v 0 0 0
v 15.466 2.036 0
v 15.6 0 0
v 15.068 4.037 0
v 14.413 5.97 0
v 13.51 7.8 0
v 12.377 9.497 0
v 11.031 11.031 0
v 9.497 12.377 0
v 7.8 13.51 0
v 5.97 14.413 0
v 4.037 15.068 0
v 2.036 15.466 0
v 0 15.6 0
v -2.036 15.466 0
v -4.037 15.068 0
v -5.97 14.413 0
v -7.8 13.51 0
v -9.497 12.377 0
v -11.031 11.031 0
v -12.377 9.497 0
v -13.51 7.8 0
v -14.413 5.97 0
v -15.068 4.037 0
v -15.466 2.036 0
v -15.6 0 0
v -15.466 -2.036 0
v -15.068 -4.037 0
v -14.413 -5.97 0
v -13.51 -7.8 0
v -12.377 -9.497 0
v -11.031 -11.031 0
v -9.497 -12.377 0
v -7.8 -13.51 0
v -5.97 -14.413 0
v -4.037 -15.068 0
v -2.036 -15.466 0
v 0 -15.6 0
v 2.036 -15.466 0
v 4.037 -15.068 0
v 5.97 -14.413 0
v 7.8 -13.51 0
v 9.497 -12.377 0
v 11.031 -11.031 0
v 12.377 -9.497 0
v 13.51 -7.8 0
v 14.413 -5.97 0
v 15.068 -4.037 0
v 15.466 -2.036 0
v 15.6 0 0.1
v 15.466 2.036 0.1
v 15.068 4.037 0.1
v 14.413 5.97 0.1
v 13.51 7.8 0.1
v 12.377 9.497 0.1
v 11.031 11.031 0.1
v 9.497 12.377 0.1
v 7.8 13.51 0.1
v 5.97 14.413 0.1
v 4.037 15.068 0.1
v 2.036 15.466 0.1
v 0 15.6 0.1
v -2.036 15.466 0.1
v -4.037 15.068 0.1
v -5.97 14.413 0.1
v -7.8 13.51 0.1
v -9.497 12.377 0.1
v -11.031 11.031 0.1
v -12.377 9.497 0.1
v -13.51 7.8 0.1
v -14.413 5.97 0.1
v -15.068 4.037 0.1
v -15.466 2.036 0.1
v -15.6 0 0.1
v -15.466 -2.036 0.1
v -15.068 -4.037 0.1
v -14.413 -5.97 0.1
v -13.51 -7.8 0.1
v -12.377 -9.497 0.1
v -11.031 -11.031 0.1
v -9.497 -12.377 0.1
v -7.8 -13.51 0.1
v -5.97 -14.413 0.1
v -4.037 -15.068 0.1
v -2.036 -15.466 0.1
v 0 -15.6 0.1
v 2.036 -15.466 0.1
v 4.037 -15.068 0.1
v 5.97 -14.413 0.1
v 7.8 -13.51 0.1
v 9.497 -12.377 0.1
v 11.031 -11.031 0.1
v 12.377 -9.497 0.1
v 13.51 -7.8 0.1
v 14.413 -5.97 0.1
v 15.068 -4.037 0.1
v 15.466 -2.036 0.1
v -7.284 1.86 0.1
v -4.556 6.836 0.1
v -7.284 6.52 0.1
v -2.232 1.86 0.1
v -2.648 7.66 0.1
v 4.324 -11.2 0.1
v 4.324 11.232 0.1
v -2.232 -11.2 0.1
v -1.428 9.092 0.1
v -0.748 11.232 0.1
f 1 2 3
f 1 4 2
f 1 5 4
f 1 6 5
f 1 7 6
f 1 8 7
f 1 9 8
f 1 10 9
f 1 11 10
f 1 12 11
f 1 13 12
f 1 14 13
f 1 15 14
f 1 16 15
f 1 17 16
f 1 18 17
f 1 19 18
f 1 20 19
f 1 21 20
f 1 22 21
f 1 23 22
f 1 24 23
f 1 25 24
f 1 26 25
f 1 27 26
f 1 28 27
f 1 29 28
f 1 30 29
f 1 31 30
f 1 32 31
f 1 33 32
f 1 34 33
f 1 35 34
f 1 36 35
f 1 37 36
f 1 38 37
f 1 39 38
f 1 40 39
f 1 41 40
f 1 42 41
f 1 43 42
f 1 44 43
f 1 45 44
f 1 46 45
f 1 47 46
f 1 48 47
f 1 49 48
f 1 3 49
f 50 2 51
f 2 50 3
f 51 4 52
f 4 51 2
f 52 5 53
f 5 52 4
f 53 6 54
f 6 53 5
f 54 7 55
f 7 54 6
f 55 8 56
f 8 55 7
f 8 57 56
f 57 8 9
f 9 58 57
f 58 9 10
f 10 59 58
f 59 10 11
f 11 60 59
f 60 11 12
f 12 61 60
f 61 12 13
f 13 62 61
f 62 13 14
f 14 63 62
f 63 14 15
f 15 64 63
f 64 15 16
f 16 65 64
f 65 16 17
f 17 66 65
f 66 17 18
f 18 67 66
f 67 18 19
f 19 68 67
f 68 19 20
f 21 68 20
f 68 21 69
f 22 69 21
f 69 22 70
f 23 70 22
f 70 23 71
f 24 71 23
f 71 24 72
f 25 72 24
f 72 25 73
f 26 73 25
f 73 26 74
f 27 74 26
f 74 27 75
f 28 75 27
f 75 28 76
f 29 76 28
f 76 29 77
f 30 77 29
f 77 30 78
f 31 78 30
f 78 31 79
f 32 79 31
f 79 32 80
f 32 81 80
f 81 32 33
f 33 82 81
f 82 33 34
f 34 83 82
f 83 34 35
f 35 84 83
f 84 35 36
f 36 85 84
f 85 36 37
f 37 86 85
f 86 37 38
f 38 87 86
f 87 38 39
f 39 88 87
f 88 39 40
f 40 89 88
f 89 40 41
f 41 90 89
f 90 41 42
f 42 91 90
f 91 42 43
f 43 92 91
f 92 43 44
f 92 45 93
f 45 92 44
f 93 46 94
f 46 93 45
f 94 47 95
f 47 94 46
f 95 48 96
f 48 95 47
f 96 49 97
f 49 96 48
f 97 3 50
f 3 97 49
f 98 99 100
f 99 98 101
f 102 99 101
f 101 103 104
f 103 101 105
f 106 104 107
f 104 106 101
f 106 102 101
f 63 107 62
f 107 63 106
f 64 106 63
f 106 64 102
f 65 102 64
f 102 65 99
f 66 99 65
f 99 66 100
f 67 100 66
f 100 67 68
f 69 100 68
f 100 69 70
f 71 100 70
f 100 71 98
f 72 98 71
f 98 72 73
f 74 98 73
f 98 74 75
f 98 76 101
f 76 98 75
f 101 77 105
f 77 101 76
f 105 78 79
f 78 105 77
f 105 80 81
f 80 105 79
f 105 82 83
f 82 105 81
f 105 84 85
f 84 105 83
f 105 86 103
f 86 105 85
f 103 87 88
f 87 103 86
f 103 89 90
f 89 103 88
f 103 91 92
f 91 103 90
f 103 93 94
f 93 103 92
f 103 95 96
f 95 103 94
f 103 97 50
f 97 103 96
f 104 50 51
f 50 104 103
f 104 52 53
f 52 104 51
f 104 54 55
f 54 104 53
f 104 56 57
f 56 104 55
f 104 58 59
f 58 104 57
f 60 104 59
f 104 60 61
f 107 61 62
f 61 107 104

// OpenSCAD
// file: ../p/48/1-4cyli.scad
use <../../lib.scad>
function ldraw_lib__48__1_4cyli() = [
// 0 Hi-Res Cylinder 0.25
// 0 Name: 48\1-4cyli.dat
// 0 Author: Manfred Moolhuysen
// 0 !LDRAW_ORG 48_Primitive UPDATE 2009-01
// 0 !LICENSE Licensed under CC BY 2.0 and CC BY 4.0 : see CAreadme.txt
// 
// 0 BFC CERTIFY CCW
  [0,"BFC","CERTIFY"],
  [0,"BFC","CCW"],
// 
// 0 !HISTORY 1999-07-05 [PTadmin] Official Update 1999-05
// 0 !HISTORY 2002-02-28 [hafhead] Added BFC statement
// 0 !HISTORY 2002-04-25 [PTadmin] Official Update 2002-02
// 0 !HISTORY 2007-06-24 [PTadmin] Header formatted for Contributor Agreement
// 0 !HISTORY 2008-07-01 [PTadmin] Official Update 2008-01
// 0 !HISTORY 2008-07-07 [guyvivan] Made BFC'ed CCW (2005-12-06)
// 0 !HISTORY 2009-05-02 [PTadmin] Official Update 2009-01
// 
// 
// 4 16 0.9914 0 0.1305 1 0 0 1 1 0 0.9914 1 0.1305
  [4,16,0.9914,0,0.1305,1,0,0,1,1,0,0.9914,1,0.1305],
// 4 16 0.9659 0 0.2588 0.9914 0 0.1305 0.9914 1 0.1305 0.9659 1 0.2588
  [4,16,0.9659,0,0.2588,0.9914,0,0.1305,0.9914,1,0.1305,0.9659,1,0.2588],
// 4 16 0.9239 0 0.3827 0.9659 0 0.2588 0.9659 1 0.2588 0.9239 1 0.3827
  [4,16,0.9239,0,0.3827,0.9659,0,0.2588,0.9659,1,0.2588,0.9239,1,0.3827],
// 4 16 0.866 0 0.5 0.9239 0 0.3827 0.9239 1 0.3827 0.866 1 0.5
  [4,16,0.866,0,0.5,0.9239,0,0.3827,0.9239,1,0.3827,0.866,1,0.5],
// 4 16 0.7934 0 0.6088 0.866 0 0.5 0.866 1 0.5 0.7934 1 0.6088
  [4,16,0.7934,0,0.6088,0.866,0,0.5,0.866,1,0.5,0.7934,1,0.6088],
// 4 16 0.7071 0 0.7071 0.7934 0 0.6088 0.7934 1 0.6088 0.7071 1 0.7071
  [4,16,0.7071,0,0.7071,0.7934,0,0.6088,0.7934,1,0.6088,0.7071,1,0.7071],
// 4 16 0.6088 0 0.7934 0.7071 0 0.7071 0.7071 1 0.7071 0.6088 1 0.7934
  [4,16,0.6088,0,0.7934,0.7071,0,0.7071,0.7071,1,0.7071,0.6088,1,0.7934],
// 4 16 0.5 0 0.866 0.6088 0 0.7934 0.6088 1 0.7934 0.5 1 0.866
  [4,16,0.5,0,0.866,0.6088,0,0.7934,0.6088,1,0.7934,0.5,1,0.866],
// 4 16 0.3827 0 0.9239 0.5 0 0.866 0.5 1 0.866 0.3827 1 0.9239
  [4,16,0.3827,0,0.9239,0.5,0,0.866,0.5,1,0.866,0.3827,1,0.9239],
// 4 16 0.2588 0 0.9659 0.3827 0 0.9239 0.3827 1 0.9239 0.2588 1 0.9659
  [4,16,0.2588,0,0.9659,0.3827,0,0.9239,0.3827,1,0.9239,0.2588,1,0.9659],
// 4 16 0.1305 0 0.9914 0.2588 0 0.9659 0.2588 1 0.9659 0.1305 1 0.9914
  [4,16,0.1305,0,0.9914,0.2588,0,0.9659,0.2588,1,0.9659,0.1305,1,0.9914],
// 4 16 0 0 1 0.1305 0 0.9914 0.1305 1 0.9914 0 1 1
  [4,16,0,0,1,0.1305,0,0.9914,0.1305,1,0.9914,0,1,1],
// 
// 0 conditional lines
// 5 24 1 1 0 1 0 0 1 1 -1 0.9914 1 0.1305
  [5,24,1,1,0,1,0,0,1,1,-1,0.9914,1,0.1305],
// 5 24 0.9914 1 0.1305 0.9914 0 0.1305 1 1 0 0.9659 1 0.2588
  [5,24,0.9914,1,0.1305,0.9914,0,0.1305,1,1,0,0.9659,1,0.2588],
// 5 24 0.9659 1 0.2588 0.9659 0 0.2588 0.9914 1 0.1305 0.9239 1 0.3827
  [5,24,0.9659,1,0.2588,0.9659,0,0.2588,0.9914,1,0.1305,0.9239,1,0.3827],
// 5 24 0.9239 1 0.3827 0.9239 0 0.3827 0.9659 1 0.2588 0.866 1 0.5
  [5,24,0.9239,1,0.3827,0.9239,0,0.3827,0.9659,1,0.2588,0.866,1,0.5],
// 5 24 0.866 1 0.5 0.866 0 0.5 0.9239 1 0.3827 0.7934 1 0.6088
  [5,24,0.866,1,0.5,0.866,0,0.5,0.9239,1,0.3827,0.7934,1,0.6088],
// 5 24 0.7934 1 0.6088 0.7934 0 0.6088 0.866 1 0.5 0.7071 1 0.7071
  [5,24,0.7934,1,0.6088,0.7934,0,0.6088,0.866,1,0.5,0.7071,1,0.7071],
// 5 24 0.7071 1 0.7071 0.7071 0 0.7071 0.7934 1 0.6088 0.6088 1 0.7934
  [5,24,0.7071,1,0.7071,0.7071,0,0.7071,0.7934,1,0.6088,0.6088,1,0.7934],
// 5 24 0.6088 1 0.7934 0.6088 0 0.7934 0.7071 1 0.7071 0.5 1 0.866
  [5,24,0.6088,1,0.7934,0.6088,0,0.7934,0.7071,1,0.7071,0.5,1,0.866],
// 5 24 0.5 1 0.866 0.5 0 0.866 0.6088 1 0.7934 0.3827 1 0.9239
  [5,24,0.5,1,0.866,0.5,0,0.866,0.6088,1,0.7934,0.3827,1,0.9239],
// 5 24 0.3827 1 0.9239 0.3827 0 0.9239 0.5 1 0.866 0.2588 1 0.9659
  [5,24,0.3827,1,0.9239,0.3827,0,0.9239,0.5,1,0.866,0.2588,1,0.9659],
// 5 24 0.2588 1 0.9659 0.2588 0 0.9659 0.3827 1 0.9239 0.1305 1 0.9914
  [5,24,0.2588,1,0.9659,0.2588,0,0.9659,0.3827,1,0.9239,0.1305,1,0.9914],
// 5 24 0.1305 1 0.9914 0.1305 0 0.9914 0.2588 1 0.9659 0 1 1
  [5,24,0.1305,1,0.9914,0.1305,0,0.9914,0.2588,1,0.9659,0,1,1],
// 5 24 0 1 1 0 0 1 0.1305 1 0.9914 -1 1 1
  [5,24,0,1,1,0,0,1,0.1305,1,0.9914,-1,1,1],
// 
// 0 end of file
];
module ldraw_lib__48__1_4cyli(step=0, col=false, unit=2/5, alt=false, line=0.2, solid=!$preview)
    makepoly(ldraw_lib__48__1_4cyli(), step=step, col=col, unit=unit, alt=alt, line=line, solid=solid);
ldraw_lib__48__1_4cyli(line=0.2);
// file: ../p/48/4-4disc.scad
use <../../lib.scad>
function ldraw_lib__48__4_4disc() = [
// 0 Hi-Res Disc 1.0
// 0 Name: 48\4-4disc.dat
// 0 Author: Miklos Hosszu [hmick]
// 0 !LDRAW_ORG 48_Primitive UPDATE 2012-02
// 0 !LICENSE Licensed under CC BY 2.0 and CC BY 4.0 : see CAreadme.txt
// 
// 0 BFC CERTIFY CCW
  [0,"BFC","CERTIFY"],
  [0,"BFC","CCW"],
// 
// 0 !HISTORY 2004-11-06 [PTadmin] Official Update 2004-04
// 0 !HISTORY 2007-06-24 [PTadmin] Header formatted for Contributor Agreement
// 0 !HISTORY 2008-07-01 [PTadmin] Official Update 2008-01
// 0 !HISTORY 2012-02-27 [Philo] Changed to CCW
// 0 !HISTORY 2012-08-09 [PTadmin] Official Update 2012-02
// 
// 
// 3 16 1 0 0 0.9914 0 0.1305 0 0 0
  [3,16,1,0,0,0.9914,0,0.1305,0,0,0],
// 3 16 0.9914 0 0.1305 0.9659 0 0.2588 0 0 0
  [3,16,0.9914,0,0.1305,0.9659,0,0.2588,0,0,0],
// 3 16 0.9659 0 0.2588 0.9239 0 0.3827 0 0 0
  [3,16,0.9659,0,0.2588,0.9239,0,0.3827,0,0,0],
// 3 16 0.9239 0 0.3827 0.866 0 0.5 0 0 0
  [3,16,0.9239,0,0.3827,0.866,0,0.5,0,0,0],
// 3 16 0.866 0 0.5 0.7934 0 0.6088 0 0 0
  [3,16,0.866,0,0.5,0.7934,0,0.6088,0,0,0],
// 3 16 0.7934 0 0.6088 0.7071 0 0.7071 0 0 0
  [3,16,0.7934,0,0.6088,0.7071,0,0.7071,0,0,0],
// 3 16 0.7071 0 0.7071 0.6088 0 0.7934 0 0 0
  [3,16,0.7071,0,0.7071,0.6088,0,0.7934,0,0,0],
// 3 16 0.6088 0 0.7934 0.5 0 0.866 0 0 0
  [3,16,0.6088,0,0.7934,0.5,0,0.866,0,0,0],
// 3 16 0.5 0 0.866 0.3827 0 0.9239 0 0 0
  [3,16,0.5,0,0.866,0.3827,0,0.9239,0,0,0],
// 3 16 0.3827 0 0.9239 0.2588 0 0.9659 0 0 0
  [3,16,0.3827,0,0.9239,0.2588,0,0.9659,0,0,0],
// 3 16 0.2588 0 0.9659 0.1305 0 0.9914 0 0 0
  [3,16,0.2588,0,0.9659,0.1305,0,0.9914,0,0,0],
// 3 16 0.1305 0 0.9914 0 0 1 0 0 0
  [3,16,0.1305,0,0.9914,0,0,1,0,0,0],
// 3 16 0 0 1 -0.1305 0 0.9914 0 0 0
  [3,16,0,0,1,-0.1305,0,0.9914,0,0,0],
// 3 16 -0.1305 0 0.9914 -0.2588 0 0.9659 0 0 0
  [3,16,-0.1305,0,0.9914,-0.2588,0,0.9659,0,0,0],
// 3 16 -0.2588 0 0.9659 -0.3827 0 0.9239 0 0 0
  [3,16,-0.2588,0,0.9659,-0.3827,0,0.9239,0,0,0],
// 3 16 -0.3827 0 0.9239 -0.5 0 0.866 0 0 0
  [3,16,-0.3827,0,0.9239,-0.5,0,0.866,0,0,0],
// 3 16 -0.5 0 0.866 -0.6088 0 0.7934 0 0 0
  [3,16,-0.5,0,0.866,-0.6088,0,0.7934,0,0,0],
// 3 16 -0.6088 0 0.7934 -0.7071 0 0.7071 0 0 0
  [3,16,-0.6088,0,0.7934,-0.7071,0,0.7071,0,0,0],
// 3 16 -0.7071 0 0.7071 -0.7934 0 0.6088 0 0 0
  [3,16,-0.7071,0,0.7071,-0.7934,0,0.6088,0,0,0],
// 3 16 -0.7934 0 0.6088 -0.866 0 0.5 0 0 0
  [3,16,-0.7934,0,0.6088,-0.866,0,0.5,0,0,0],
// 3 16 -0.866 0 0.5 -0.9239 0 0.3827 0 0 0
  [3,16,-0.866,0,0.5,-0.9239,0,0.3827,0,0,0],
// 3 16 -0.9239 0 0.3827 -0.9659 0 0.2588 0 0 0
  [3,16,-0.9239,0,0.3827,-0.9659,0,0.2588,0,0,0],
// 3 16 -0.9659 0 0.2588 -0.9914 0 0.1305 0 0 0
  [3,16,-0.9659,0,0.2588,-0.9914,0,0.1305,0,0,0],
// 3 16 -0.9914 0 0.1305 -1 0 0 0 0 0
  [3,16,-0.9914,0,0.1305,-1,0,0,0,0,0],
// 3 16 -1 0 0 -0.9914 0 -0.1305 0 0 0
  [3,16,-1,0,0,-0.9914,0,-0.1305,0,0,0],
// 3 16 -0.9914 0 -0.1305 -0.9659 0 -0.2588 0 0 0
  [3,16,-0.9914,0,-0.1305,-0.9659,0,-0.2588,0,0,0],
// 3 16 -0.9659 0 -0.2588 -0.9239 0 -0.3827 0 0 0
  [3,16,-0.9659,0,-0.2588,-0.9239,0,-0.3827,0,0,0],
// 3 16 -0.9239 0 -0.3827 -0.866 0 -0.5 0 0 0
  [3,16,-0.9239,0,-0.3827,-0.866,0,-0.5,0,0,0],
// 3 16 -0.866 0 -0.5 -0.7934 0 -0.6088 0 0 0
  [3,16,-0.866,0,-0.5,-0.7934,0,-0.6088,0,0,0],
// 3 16 -0.7934 0 -0.6088 -0.7071 0 -0.7071 0 0 0
  [3,16,-0.7934,0,-0.6088,-0.7071,0,-0.7071,0,0,0],
// 3 16 -0.7071 0 -0.7071 -0.6088 0 -0.7934 0 0 0
  [3,16,-0.7071,0,-0.7071,-0.6088,0,-0.7934,0,0,0],
// 3 16 -0.6088 0 -0.7934 -0.5 0 -0.866 0 0 0
  [3,16,-0.6088,0,-0.7934,-0.5,0,-0.866,0,0,0],
// 3 16 -0.5 0 -0.866 -0.3827 0 -0.9239 0 0 0
  [3,16,-0.5,0,-0.866,-0.3827,0,-0.9239,0,0,0],
// 3 16 -0.3827 0 -0.9239 -0.2588 0 -0.9659 0 0 0
  [3,16,-0.3827,0,-0.9239,-0.2588,0,-0.9659,0,0,0],
// 3 16 -0.2588 0 -0.9659 -0.1305 0 -0.9914 0 0 0
  [3,16,-0.2588,0,-0.9659,-0.1305,0,-0.9914,0,0,0],
// 3 16 -0.1305 0 -0.9914 0 0 -1 0 0 0
  [3,16,-0.1305,0,-0.9914,0,0,-1,0,0,0],
// 3 16 0 0 -1 0.1305 0 -0.9914 0 0 0
  [3,16,0,0,-1,0.1305,0,-0.9914,0,0,0],
// 3 16 0.1305 0 -0.9914 0.2588 0 -0.9659 0 0 0
  [3,16,0.1305,0,-0.9914,0.2588,0,-0.9659,0,0,0],
// 3 16 0.2588 0 -0.9659 0.3827 0 -0.9239 0 0 0
  [3,16,0.2588,0,-0.9659,0.3827,0,-0.9239,0,0,0],
// 3 16 0.3827 0 -0.9239 0.5 0 -0.866 0 0 0
  [3,16,0.3827,0,-0.9239,0.5,0,-0.866,0,0,0],
// 3 16 0.5 0 -0.866 0.6088 0 -0.7934 0 0 0
  [3,16,0.5,0,-0.866,0.6088,0,-0.7934,0,0,0],
// 3 16 0.6088 0 -0.7934 0.7071 0 -0.7071 0 0 0
  [3,16,0.6088,0,-0.7934,0.7071,0,-0.7071,0,0,0],
// 3 16 0.7071 0 -0.7071 0.7934 0 -0.6088 0 0 0
  [3,16,0.7071,0,-0.7071,0.7934,0,-0.6088,0,0,0],
// 3 16 0.7934 0 -0.6088 0.866 0 -0.5 0 0 0
  [3,16,0.7934,0,-0.6088,0.866,0,-0.5,0,0,0],
// 3 16 0.866 0 -0.5 0.9239 0 -0.3827 0 0 0
  [3,16,0.866,0,-0.5,0.9239,0,-0.3827,0,0,0],
// 3 16 0.9239 0 -0.3827 0.9659 0 -0.2588 0 0 0
  [3,16,0.9239,0,-0.3827,0.9659,0,-0.2588,0,0,0],
// 3 16 0.9659 0 -0.2588 0.9914 0 -0.1305 0 0 0
  [3,16,0.9659,0,-0.2588,0.9914,0,-0.1305,0,0,0],
// 3 16 0.9914 0 -0.1305 1 0 0 0 0 0
  [3,16,0.9914,0,-0.1305,1,0,0,0,0,0],
];
module ldraw_lib__48__4_4disc(step=0, col=false, unit=2/5, alt=false, line=0.2, solid=!$preview)
    makepoly(ldraw_lib__48__4_4disc(), step=step, col=col, unit=unit, alt=alt, line=line, solid=solid);
ldraw_lib__48__4_4disc(line=0.2);
// file: ../p/48/4-4cyli.scad
use <../../lib.scad>
use <1-4cyli.scad>
function ldraw_lib__48__4_4cyli() = [
// 0 Hi-Res Cylinder 1.0
// 0 Name: 48\4-4cyli.dat
// 0 Author: Paul Easter [pneaster]
// 0 !LDRAW_ORG 48_Primitive UPDATE 2012-02
// 0 !LICENSE Licensed under CC BY 4.0 : see CAreadme.txt
// 
// 0 BFC CERTIFY CCW
  [0,"BFC","CERTIFY"],
  [0,"BFC","CCW"],
// 
// 0 !HISTORY 2002-08-18 [PTadmin] Official Update 2002-04
// 0 !HISTORY 2007-06-24 [PTadmin] Header formatted for Contributor Agreement
// 0 !HISTORY 2008-07-01 [PTadmin] Official Update 2008-01
// 0 !HISTORY 2012-02-27 [Philo] Changed to CCW
// 0 !HISTORY 2012-08-09 [PTadmin] Official Update 2012-02
// 
// 
// 1 16 0 0 0 1 0 0 0 1 0 0 0 1 48\1-4cyli.dat
  [1,16,0,0,0,1,0,0,0,1,0,0,0,1, ldraw_lib__48__1_4cyli()],
// 1 16 0 0 0 0 0 -1 0 1 0 1 0 0 48\1-4cyli.dat
  [1,16,0,0,0,0,0,-1,0,1,0,1,0,0, ldraw_lib__48__1_4cyli()],
// 1 16 0 0 0 -1 0 0 0 1 0 0 0 -1 48\1-4cyli.dat
  [1,16,0,0,0,-1,0,0,0,1,0,0,0,-1, ldraw_lib__48__1_4cyli()],
// 1 16 0 0 0 0 0 1 0 1 0 -1 0 0 48\1-4cyli.dat
  [1,16,0,0,0,0,0,1,0,1,0,-1,0,0, ldraw_lib__48__1_4cyli()],
];
module ldraw_lib__48__4_4cyli(step=0, col=false, unit=2/5, alt=false, line=0.2, solid=!$preview)
    makepoly(ldraw_lib__48__4_4cyli(), step=step, col=col, unit=unit, alt=alt, line=line, solid=solid);
ldraw_lib__48__4_4cyli(line=0.2);
// file: ../p/48/4-4cylc3.scad
use <../../lib.scad>
use <4-4cyli.scad>
use <4-4disc.scad>
function ldraw_lib__48__4_4cylc3() = [
// 0 Hi-Res Cylinder Closed 1.0 without Top or Bottom Edge Lines
// 0 Name: 48\4-4cylc3.dat
// 0 Author: Chris Dee [cwdee]
// 0 !LDRAW_ORG 48_Primitive UPDATE 2017-01
// 0 !LICENSE Licensed under CC BY 4.0 : see CAreadme.txt
// 
// 0 BFC CERTIFY CCW
  [0,"BFC","CERTIFY"],
  [0,"BFC","CCW"],
// 
// 0 !HISTORY 2017-12-30 [PTadmin] Official Update 2017-01
// 
// 
// 1 16 0 0 0 1 0 0 0 1 0 0 0 1 48\4-4disc.dat
  [1,16,0,0,0,1,0,0,0,1,0,0,0,1, ldraw_lib__48__4_4disc()],
// 1 16 0 0 0 1 0 0 0 1 0 0 0 1 48\4-4cyli.dat
  [1,16,0,0,0,1,0,0,0,1,0,0,0,1, ldraw_lib__48__4_4cyli()],
// 0
];
module ldraw_lib__48__4_4cylc3(step=0, col=false, unit=2/5, alt=false, line=0.2, solid=!$preview)
    makepoly(ldraw_lib__48__4_4cylc3(), step=step, col=col, unit=unit, alt=alt, line=line, solid=solid);
ldraw_lib__48__4_4cylc3(line=0.2);
// main file
use <../lib.scad>
use <../p/48/4-4cylc3.scad>
function ldraw_lib__004462a() = [
// 0 Sticker  3.9 x  3.9 Round with Black "1" on White Background
// 0 Name: 004462a.dat
// 0 Author: Takeshi Takahashi [RainbowDolphin]
// 0 !LDRAW_ORG Part UPDATE 2023-03
// 0 !LICENSE Licensed under CC BY 4.0 : see CAreadme.txt
// 
// 0 BFC CERTIFY CCW
  [0,"BFC","CERTIFY"],
  [0,"BFC","CCW"],
// 
// 0 !KEYWORDS Bricklink 392.1stk01, Brickowl 792264, Formula 1, Racer
// 0 !KEYWORDS Rebrickable 004462, Set 392-1
// 
// 0 !HISTORY 2023-06-24 [OrionP] Official Update 2023-03
// 
// 
// 1 16 0 0 0 39 0 0 0 -0.25 0 0 0 39 48\4-4cylc3.dat
  [1,16,0,0,0,39,0,0,0,-0.25,0,0,0,39, ldraw_lib__48__4_4cylc3()],
// 4 0 -18.21 -0.25 4.65 -5.58 -0.25 4.65 -11.39 -0.25 17.09 -18.21 -0.25 16.3
  [4,0,-18.21,-0.25,4.65,-5.58,-0.25,4.65,-11.39,-0.25,17.09,-18.21,-0.25,16.3],
// 3 0 -6.62 -0.25 19.15 -11.39 -0.25 17.09 -5.58 -0.25 4.65
  [3,0,-6.62,-0.25,19.15,-11.39,-0.25,17.09,-5.58,-0.25,4.65],
// 4 0 10.81 -0.25 -28 10.81 -0.25 28.08 -5.58 -0.25 4.65 -5.58 -0.25 -28
  [4,0,10.81,-0.25,-28,10.81,-0.25,28.08,-5.58,-0.25,4.65,-5.58,-0.25,-28],
// 4 0 10.81 -0.25 28.08 -1.87 -0.25 28.08 -3.57 -0.25 22.73 -5.58 -0.25 4.65
  [4,0,10.81,-0.25,28.08,-1.87,-0.25,28.08,-3.57,-0.25,22.73,-5.58,-0.25,4.65],
// 3 0 -3.57 -0.25 22.73 -6.62 -0.25 19.15 -5.58 -0.25 4.65
  [3,0,-3.57,-0.25,22.73,-6.62,-0.25,19.15,-5.58,-0.25,4.65],
// 4 15 -1.87 -0.25 28.08 0 -0.25 39 -5.0895 -0.25 38.6646 -3.57 -0.25 22.73
  [4,15,-1.87,-0.25,28.08,0,-0.25,39,-5.0895,-0.25,38.6646,-3.57,-0.25,22.73],
// 4 15 -3.57 -0.25 22.73 -5.0895 -0.25 38.6646 -10.0932 -0.25 37.6701 -6.62 -0.25 19.15
  [4,15,-3.57,-0.25,22.73,-5.0895,-0.25,38.6646,-10.0932,-0.25,37.6701,-6.62,-0.25,19.15],
// 4 15 -6.62 -0.25 19.15 -10.0932 -0.25 37.6701 -14.9253 -0.25 36.0321 -11.39 -0.25 17.09
  [4,15,-6.62,-0.25,19.15,-10.0932,-0.25,37.6701,-14.9253,-0.25,36.0321,-11.39,-0.25,17.09],
// 4 15 -11.39 -0.25 17.09 -14.9253 -0.25 36.0321 -19.5 -0.25 33.774 -18.21 -0.25 16.3
  [4,15,-11.39,-0.25,17.09,-14.9253,-0.25,36.0321,-19.5,-0.25,33.774,-18.21,-0.25,16.3],
// 4 15 -18.21 -0.25 16.3 -19.5 -0.25 33.774 -23.7432 -0.25 30.9426 -27.5769 -0.25 27.5769
  [4,15,-18.21,-0.25,16.3,-19.5,-0.25,33.774,-23.7432,-0.25,30.9426,-27.5769,-0.25,27.5769],
// 4 15 -18.21 -0.25 16.3 -27.5769 -0.25 27.5769 -30.9426 -0.25 23.7432 -33.774 -0.25 19.5
  [4,15,-18.21,-0.25,16.3,-27.5769,-0.25,27.5769,-30.9426,-0.25,23.7432,-33.774,-0.25,19.5],
// 4 15 -18.21 -0.25 4.65 -18.21 -0.25 16.3 -33.774 -0.25 19.5 -36.0321 -0.25 14.9253
  [4,15,-18.21,-0.25,4.65,-18.21,-0.25,16.3,-33.774,-0.25,19.5,-36.0321,-0.25,14.9253],
// 4 15 -18.21 -0.25 4.65 -36.0321 -0.25 14.9253 -37.6701 -0.25 10.0932 -38.6646 -0.25 5.0895
  [4,15,-18.21,-0.25,4.65,-36.0321,-0.25,14.9253,-37.6701,-0.25,10.0932,-38.6646,-0.25,5.0895],
// 4 15 -18.21 -0.25 4.65 -38.6646 -0.25 5.0895 -39 -0.25 0 -38.6646 -0.25 -5.0895
  [4,15,-18.21,-0.25,4.65,-38.6646,-0.25,5.0895,-39,-0.25,0,-38.6646,-0.25,-5.0895],
// 4 15 -5.58 -0.25 4.65 -18.21 -0.25 4.65 -38.6646 -0.25 -5.0895 -37.6701 -0.25 -10.0932
  [4,15,-5.58,-0.25,4.65,-18.21,-0.25,4.65,-38.6646,-0.25,-5.0895,-37.6701,-0.25,-10.0932],
// 4 15 -5.58 -0.25 4.65 -37.6701 -0.25 -10.0932 -36.0321 -0.25 -14.9253 -5.58 -0.25 -28
  [4,15,-5.58,-0.25,4.65,-37.6701,-0.25,-10.0932,-36.0321,-0.25,-14.9253,-5.58,-0.25,-28],
// 4 15 -5.58 -0.25 -28 -36.0321 -0.25 -14.9253 -33.774 -0.25 -19.5 -30.9426 -0.25 -23.7432
  [4,15,-5.58,-0.25,-28,-36.0321,-0.25,-14.9253,-33.774,-0.25,-19.5,-30.9426,-0.25,-23.7432],
// 4 15 -5.58 -0.25 -28 -30.9426 -0.25 -23.7432 -27.5769 -0.25 -27.5769 -23.7432 -0.25 -30.9426
  [4,15,-5.58,-0.25,-28,-30.9426,-0.25,-23.7432,-27.5769,-0.25,-27.5769,-23.7432,-0.25,-30.9426],
// 4 15 -5.58 -0.25 -28 -23.7432 -0.25 -30.9426 -19.5 -0.25 -33.774 -14.9253 -0.25 -36.0321
  [4,15,-5.58,-0.25,-28,-23.7432,-0.25,-30.9426,-19.5,-0.25,-33.774,-14.9253,-0.25,-36.0321],
// 4 15 -5.58 -0.25 -28 -14.9253 -0.25 -36.0321 -10.0932 -0.25 -37.6701 -5.0895 -0.25 -38.6646
  [4,15,-5.58,-0.25,-28,-14.9253,-0.25,-36.0321,-10.0932,-0.25,-37.6701,-5.0895,-0.25,-38.6646],
// 4 15 -5.58 -0.25 -28 -5.0895 -0.25 -38.6646 0 -0.25 -39 10.81 -0.25 -28
  [4,15,-5.58,-0.25,-28,-5.0895,-0.25,-38.6646,0,-0.25,-39,10.81,-0.25,-28],
// 4 15 10.81 -0.25 -28 0 -0.25 -39 5.0895 -0.25 -38.6646 10.0932 -0.25 -37.6701
  [4,15,10.81,-0.25,-28,0,-0.25,-39,5.0895,-0.25,-38.6646,10.0932,-0.25,-37.6701],
// 4 15 10.81 -0.25 -28 10.0932 -0.25 -37.6701 14.9253 -0.25 -36.0321 19.5 -0.25 -33.774
  [4,15,10.81,-0.25,-28,10.0932,-0.25,-37.6701,14.9253,-0.25,-36.0321,19.5,-0.25,-33.774],
// 4 15 10.81 -0.25 -28 19.5 -0.25 -33.774 23.7432 -0.25 -30.9426 27.5769 -0.25 -27.5769
  [4,15,10.81,-0.25,-28,19.5,-0.25,-33.774,23.7432,-0.25,-30.9426,27.5769,-0.25,-27.5769],
// 4 15 10.81 -0.25 -28 27.5769 -0.25 -27.5769 30.9426 -0.25 -23.7432 33.774 -0.25 -19.5
  [4,15,10.81,-0.25,-28,27.5769,-0.25,-27.5769,30.9426,-0.25,-23.7432,33.774,-0.25,-19.5],
// 4 15 10.81 -0.25 -28 33.774 -0.25 -19.5 36.0321 -0.25 -14.9253 37.6701 -0.25 -10.0932
  [4,15,10.81,-0.25,-28,33.774,-0.25,-19.5,36.0321,-0.25,-14.9253,37.6701,-0.25,-10.0932],
// 4 15 10.81 -0.25 -28 37.6701 -0.25 -10.0932 38.6646 -0.25 -5.0895 39 -0.25 0
  [4,15,10.81,-0.25,-28,37.6701,-0.25,-10.0932,38.6646,-0.25,-5.0895,39,-0.25,0],
// 4 15 10.81 -0.25 28.08 10.81 -0.25 -28 39 -0.25 0 38.6646 -0.25 5.0895
  [4,15,10.81,-0.25,28.08,10.81,-0.25,-28,39,-0.25,0,38.6646,-0.25,5.0895],
// 4 15 10.81 -0.25 28.08 38.6646 -0.25 5.0895 37.6701 -0.25 10.0932 36.0321 -0.25 14.9253
  [4,15,10.81,-0.25,28.08,38.6646,-0.25,5.0895,37.6701,-0.25,10.0932,36.0321,-0.25,14.9253],
// 4 15 10.81 -0.25 28.08 36.0321 -0.25 14.9253 33.774 -0.25 19.5 30.9426 -0.25 23.7432
  [4,15,10.81,-0.25,28.08,36.0321,-0.25,14.9253,33.774,-0.25,19.5,30.9426,-0.25,23.7432],
// 4 15 10.81 -0.25 28.08 30.9426 -0.25 23.7432 27.5769 -0.25 27.5769 23.7432 -0.25 30.9426
  [4,15,10.81,-0.25,28.08,30.9426,-0.25,23.7432,27.5769,-0.25,27.5769,23.7432,-0.25,30.9426],
// 4 15 10.81 -0.25 28.08 23.7432 -0.25 30.9426 19.5 -0.25 33.774 14.9253 -0.25 36.0321
  [4,15,10.81,-0.25,28.08,23.7432,-0.25,30.9426,19.5,-0.25,33.774,14.9253,-0.25,36.0321],
// 4 15 10.81 -0.25 28.08 14.9253 -0.25 36.0321 10.0932 -0.25 37.6701 5.0895 -0.25 38.6646
  [4,15,10.81,-0.25,28.08,14.9253,-0.25,36.0321,10.0932,-0.25,37.6701,5.0895,-0.25,38.6646],
// 4 15 -1.87 -0.25 28.08 10.81 -0.25 28.08 5.0895 -0.25 38.6646 0 -0.25 39
  [4,15,-1.87,-0.25,28.08,10.81,-0.25,28.08,5.0895,-0.25,38.6646,0,-0.25,39],
];
module ldraw_lib__004462a(step=0, col=false, unit=2/5, alt=false, line=0.2, solid=!$preview)
    makepoly(ldraw_lib__004462a(), step=step, col=col, unit=unit, alt=alt, line=line, solid=solid);
ldraw_lib__004462a(line=0.2);
